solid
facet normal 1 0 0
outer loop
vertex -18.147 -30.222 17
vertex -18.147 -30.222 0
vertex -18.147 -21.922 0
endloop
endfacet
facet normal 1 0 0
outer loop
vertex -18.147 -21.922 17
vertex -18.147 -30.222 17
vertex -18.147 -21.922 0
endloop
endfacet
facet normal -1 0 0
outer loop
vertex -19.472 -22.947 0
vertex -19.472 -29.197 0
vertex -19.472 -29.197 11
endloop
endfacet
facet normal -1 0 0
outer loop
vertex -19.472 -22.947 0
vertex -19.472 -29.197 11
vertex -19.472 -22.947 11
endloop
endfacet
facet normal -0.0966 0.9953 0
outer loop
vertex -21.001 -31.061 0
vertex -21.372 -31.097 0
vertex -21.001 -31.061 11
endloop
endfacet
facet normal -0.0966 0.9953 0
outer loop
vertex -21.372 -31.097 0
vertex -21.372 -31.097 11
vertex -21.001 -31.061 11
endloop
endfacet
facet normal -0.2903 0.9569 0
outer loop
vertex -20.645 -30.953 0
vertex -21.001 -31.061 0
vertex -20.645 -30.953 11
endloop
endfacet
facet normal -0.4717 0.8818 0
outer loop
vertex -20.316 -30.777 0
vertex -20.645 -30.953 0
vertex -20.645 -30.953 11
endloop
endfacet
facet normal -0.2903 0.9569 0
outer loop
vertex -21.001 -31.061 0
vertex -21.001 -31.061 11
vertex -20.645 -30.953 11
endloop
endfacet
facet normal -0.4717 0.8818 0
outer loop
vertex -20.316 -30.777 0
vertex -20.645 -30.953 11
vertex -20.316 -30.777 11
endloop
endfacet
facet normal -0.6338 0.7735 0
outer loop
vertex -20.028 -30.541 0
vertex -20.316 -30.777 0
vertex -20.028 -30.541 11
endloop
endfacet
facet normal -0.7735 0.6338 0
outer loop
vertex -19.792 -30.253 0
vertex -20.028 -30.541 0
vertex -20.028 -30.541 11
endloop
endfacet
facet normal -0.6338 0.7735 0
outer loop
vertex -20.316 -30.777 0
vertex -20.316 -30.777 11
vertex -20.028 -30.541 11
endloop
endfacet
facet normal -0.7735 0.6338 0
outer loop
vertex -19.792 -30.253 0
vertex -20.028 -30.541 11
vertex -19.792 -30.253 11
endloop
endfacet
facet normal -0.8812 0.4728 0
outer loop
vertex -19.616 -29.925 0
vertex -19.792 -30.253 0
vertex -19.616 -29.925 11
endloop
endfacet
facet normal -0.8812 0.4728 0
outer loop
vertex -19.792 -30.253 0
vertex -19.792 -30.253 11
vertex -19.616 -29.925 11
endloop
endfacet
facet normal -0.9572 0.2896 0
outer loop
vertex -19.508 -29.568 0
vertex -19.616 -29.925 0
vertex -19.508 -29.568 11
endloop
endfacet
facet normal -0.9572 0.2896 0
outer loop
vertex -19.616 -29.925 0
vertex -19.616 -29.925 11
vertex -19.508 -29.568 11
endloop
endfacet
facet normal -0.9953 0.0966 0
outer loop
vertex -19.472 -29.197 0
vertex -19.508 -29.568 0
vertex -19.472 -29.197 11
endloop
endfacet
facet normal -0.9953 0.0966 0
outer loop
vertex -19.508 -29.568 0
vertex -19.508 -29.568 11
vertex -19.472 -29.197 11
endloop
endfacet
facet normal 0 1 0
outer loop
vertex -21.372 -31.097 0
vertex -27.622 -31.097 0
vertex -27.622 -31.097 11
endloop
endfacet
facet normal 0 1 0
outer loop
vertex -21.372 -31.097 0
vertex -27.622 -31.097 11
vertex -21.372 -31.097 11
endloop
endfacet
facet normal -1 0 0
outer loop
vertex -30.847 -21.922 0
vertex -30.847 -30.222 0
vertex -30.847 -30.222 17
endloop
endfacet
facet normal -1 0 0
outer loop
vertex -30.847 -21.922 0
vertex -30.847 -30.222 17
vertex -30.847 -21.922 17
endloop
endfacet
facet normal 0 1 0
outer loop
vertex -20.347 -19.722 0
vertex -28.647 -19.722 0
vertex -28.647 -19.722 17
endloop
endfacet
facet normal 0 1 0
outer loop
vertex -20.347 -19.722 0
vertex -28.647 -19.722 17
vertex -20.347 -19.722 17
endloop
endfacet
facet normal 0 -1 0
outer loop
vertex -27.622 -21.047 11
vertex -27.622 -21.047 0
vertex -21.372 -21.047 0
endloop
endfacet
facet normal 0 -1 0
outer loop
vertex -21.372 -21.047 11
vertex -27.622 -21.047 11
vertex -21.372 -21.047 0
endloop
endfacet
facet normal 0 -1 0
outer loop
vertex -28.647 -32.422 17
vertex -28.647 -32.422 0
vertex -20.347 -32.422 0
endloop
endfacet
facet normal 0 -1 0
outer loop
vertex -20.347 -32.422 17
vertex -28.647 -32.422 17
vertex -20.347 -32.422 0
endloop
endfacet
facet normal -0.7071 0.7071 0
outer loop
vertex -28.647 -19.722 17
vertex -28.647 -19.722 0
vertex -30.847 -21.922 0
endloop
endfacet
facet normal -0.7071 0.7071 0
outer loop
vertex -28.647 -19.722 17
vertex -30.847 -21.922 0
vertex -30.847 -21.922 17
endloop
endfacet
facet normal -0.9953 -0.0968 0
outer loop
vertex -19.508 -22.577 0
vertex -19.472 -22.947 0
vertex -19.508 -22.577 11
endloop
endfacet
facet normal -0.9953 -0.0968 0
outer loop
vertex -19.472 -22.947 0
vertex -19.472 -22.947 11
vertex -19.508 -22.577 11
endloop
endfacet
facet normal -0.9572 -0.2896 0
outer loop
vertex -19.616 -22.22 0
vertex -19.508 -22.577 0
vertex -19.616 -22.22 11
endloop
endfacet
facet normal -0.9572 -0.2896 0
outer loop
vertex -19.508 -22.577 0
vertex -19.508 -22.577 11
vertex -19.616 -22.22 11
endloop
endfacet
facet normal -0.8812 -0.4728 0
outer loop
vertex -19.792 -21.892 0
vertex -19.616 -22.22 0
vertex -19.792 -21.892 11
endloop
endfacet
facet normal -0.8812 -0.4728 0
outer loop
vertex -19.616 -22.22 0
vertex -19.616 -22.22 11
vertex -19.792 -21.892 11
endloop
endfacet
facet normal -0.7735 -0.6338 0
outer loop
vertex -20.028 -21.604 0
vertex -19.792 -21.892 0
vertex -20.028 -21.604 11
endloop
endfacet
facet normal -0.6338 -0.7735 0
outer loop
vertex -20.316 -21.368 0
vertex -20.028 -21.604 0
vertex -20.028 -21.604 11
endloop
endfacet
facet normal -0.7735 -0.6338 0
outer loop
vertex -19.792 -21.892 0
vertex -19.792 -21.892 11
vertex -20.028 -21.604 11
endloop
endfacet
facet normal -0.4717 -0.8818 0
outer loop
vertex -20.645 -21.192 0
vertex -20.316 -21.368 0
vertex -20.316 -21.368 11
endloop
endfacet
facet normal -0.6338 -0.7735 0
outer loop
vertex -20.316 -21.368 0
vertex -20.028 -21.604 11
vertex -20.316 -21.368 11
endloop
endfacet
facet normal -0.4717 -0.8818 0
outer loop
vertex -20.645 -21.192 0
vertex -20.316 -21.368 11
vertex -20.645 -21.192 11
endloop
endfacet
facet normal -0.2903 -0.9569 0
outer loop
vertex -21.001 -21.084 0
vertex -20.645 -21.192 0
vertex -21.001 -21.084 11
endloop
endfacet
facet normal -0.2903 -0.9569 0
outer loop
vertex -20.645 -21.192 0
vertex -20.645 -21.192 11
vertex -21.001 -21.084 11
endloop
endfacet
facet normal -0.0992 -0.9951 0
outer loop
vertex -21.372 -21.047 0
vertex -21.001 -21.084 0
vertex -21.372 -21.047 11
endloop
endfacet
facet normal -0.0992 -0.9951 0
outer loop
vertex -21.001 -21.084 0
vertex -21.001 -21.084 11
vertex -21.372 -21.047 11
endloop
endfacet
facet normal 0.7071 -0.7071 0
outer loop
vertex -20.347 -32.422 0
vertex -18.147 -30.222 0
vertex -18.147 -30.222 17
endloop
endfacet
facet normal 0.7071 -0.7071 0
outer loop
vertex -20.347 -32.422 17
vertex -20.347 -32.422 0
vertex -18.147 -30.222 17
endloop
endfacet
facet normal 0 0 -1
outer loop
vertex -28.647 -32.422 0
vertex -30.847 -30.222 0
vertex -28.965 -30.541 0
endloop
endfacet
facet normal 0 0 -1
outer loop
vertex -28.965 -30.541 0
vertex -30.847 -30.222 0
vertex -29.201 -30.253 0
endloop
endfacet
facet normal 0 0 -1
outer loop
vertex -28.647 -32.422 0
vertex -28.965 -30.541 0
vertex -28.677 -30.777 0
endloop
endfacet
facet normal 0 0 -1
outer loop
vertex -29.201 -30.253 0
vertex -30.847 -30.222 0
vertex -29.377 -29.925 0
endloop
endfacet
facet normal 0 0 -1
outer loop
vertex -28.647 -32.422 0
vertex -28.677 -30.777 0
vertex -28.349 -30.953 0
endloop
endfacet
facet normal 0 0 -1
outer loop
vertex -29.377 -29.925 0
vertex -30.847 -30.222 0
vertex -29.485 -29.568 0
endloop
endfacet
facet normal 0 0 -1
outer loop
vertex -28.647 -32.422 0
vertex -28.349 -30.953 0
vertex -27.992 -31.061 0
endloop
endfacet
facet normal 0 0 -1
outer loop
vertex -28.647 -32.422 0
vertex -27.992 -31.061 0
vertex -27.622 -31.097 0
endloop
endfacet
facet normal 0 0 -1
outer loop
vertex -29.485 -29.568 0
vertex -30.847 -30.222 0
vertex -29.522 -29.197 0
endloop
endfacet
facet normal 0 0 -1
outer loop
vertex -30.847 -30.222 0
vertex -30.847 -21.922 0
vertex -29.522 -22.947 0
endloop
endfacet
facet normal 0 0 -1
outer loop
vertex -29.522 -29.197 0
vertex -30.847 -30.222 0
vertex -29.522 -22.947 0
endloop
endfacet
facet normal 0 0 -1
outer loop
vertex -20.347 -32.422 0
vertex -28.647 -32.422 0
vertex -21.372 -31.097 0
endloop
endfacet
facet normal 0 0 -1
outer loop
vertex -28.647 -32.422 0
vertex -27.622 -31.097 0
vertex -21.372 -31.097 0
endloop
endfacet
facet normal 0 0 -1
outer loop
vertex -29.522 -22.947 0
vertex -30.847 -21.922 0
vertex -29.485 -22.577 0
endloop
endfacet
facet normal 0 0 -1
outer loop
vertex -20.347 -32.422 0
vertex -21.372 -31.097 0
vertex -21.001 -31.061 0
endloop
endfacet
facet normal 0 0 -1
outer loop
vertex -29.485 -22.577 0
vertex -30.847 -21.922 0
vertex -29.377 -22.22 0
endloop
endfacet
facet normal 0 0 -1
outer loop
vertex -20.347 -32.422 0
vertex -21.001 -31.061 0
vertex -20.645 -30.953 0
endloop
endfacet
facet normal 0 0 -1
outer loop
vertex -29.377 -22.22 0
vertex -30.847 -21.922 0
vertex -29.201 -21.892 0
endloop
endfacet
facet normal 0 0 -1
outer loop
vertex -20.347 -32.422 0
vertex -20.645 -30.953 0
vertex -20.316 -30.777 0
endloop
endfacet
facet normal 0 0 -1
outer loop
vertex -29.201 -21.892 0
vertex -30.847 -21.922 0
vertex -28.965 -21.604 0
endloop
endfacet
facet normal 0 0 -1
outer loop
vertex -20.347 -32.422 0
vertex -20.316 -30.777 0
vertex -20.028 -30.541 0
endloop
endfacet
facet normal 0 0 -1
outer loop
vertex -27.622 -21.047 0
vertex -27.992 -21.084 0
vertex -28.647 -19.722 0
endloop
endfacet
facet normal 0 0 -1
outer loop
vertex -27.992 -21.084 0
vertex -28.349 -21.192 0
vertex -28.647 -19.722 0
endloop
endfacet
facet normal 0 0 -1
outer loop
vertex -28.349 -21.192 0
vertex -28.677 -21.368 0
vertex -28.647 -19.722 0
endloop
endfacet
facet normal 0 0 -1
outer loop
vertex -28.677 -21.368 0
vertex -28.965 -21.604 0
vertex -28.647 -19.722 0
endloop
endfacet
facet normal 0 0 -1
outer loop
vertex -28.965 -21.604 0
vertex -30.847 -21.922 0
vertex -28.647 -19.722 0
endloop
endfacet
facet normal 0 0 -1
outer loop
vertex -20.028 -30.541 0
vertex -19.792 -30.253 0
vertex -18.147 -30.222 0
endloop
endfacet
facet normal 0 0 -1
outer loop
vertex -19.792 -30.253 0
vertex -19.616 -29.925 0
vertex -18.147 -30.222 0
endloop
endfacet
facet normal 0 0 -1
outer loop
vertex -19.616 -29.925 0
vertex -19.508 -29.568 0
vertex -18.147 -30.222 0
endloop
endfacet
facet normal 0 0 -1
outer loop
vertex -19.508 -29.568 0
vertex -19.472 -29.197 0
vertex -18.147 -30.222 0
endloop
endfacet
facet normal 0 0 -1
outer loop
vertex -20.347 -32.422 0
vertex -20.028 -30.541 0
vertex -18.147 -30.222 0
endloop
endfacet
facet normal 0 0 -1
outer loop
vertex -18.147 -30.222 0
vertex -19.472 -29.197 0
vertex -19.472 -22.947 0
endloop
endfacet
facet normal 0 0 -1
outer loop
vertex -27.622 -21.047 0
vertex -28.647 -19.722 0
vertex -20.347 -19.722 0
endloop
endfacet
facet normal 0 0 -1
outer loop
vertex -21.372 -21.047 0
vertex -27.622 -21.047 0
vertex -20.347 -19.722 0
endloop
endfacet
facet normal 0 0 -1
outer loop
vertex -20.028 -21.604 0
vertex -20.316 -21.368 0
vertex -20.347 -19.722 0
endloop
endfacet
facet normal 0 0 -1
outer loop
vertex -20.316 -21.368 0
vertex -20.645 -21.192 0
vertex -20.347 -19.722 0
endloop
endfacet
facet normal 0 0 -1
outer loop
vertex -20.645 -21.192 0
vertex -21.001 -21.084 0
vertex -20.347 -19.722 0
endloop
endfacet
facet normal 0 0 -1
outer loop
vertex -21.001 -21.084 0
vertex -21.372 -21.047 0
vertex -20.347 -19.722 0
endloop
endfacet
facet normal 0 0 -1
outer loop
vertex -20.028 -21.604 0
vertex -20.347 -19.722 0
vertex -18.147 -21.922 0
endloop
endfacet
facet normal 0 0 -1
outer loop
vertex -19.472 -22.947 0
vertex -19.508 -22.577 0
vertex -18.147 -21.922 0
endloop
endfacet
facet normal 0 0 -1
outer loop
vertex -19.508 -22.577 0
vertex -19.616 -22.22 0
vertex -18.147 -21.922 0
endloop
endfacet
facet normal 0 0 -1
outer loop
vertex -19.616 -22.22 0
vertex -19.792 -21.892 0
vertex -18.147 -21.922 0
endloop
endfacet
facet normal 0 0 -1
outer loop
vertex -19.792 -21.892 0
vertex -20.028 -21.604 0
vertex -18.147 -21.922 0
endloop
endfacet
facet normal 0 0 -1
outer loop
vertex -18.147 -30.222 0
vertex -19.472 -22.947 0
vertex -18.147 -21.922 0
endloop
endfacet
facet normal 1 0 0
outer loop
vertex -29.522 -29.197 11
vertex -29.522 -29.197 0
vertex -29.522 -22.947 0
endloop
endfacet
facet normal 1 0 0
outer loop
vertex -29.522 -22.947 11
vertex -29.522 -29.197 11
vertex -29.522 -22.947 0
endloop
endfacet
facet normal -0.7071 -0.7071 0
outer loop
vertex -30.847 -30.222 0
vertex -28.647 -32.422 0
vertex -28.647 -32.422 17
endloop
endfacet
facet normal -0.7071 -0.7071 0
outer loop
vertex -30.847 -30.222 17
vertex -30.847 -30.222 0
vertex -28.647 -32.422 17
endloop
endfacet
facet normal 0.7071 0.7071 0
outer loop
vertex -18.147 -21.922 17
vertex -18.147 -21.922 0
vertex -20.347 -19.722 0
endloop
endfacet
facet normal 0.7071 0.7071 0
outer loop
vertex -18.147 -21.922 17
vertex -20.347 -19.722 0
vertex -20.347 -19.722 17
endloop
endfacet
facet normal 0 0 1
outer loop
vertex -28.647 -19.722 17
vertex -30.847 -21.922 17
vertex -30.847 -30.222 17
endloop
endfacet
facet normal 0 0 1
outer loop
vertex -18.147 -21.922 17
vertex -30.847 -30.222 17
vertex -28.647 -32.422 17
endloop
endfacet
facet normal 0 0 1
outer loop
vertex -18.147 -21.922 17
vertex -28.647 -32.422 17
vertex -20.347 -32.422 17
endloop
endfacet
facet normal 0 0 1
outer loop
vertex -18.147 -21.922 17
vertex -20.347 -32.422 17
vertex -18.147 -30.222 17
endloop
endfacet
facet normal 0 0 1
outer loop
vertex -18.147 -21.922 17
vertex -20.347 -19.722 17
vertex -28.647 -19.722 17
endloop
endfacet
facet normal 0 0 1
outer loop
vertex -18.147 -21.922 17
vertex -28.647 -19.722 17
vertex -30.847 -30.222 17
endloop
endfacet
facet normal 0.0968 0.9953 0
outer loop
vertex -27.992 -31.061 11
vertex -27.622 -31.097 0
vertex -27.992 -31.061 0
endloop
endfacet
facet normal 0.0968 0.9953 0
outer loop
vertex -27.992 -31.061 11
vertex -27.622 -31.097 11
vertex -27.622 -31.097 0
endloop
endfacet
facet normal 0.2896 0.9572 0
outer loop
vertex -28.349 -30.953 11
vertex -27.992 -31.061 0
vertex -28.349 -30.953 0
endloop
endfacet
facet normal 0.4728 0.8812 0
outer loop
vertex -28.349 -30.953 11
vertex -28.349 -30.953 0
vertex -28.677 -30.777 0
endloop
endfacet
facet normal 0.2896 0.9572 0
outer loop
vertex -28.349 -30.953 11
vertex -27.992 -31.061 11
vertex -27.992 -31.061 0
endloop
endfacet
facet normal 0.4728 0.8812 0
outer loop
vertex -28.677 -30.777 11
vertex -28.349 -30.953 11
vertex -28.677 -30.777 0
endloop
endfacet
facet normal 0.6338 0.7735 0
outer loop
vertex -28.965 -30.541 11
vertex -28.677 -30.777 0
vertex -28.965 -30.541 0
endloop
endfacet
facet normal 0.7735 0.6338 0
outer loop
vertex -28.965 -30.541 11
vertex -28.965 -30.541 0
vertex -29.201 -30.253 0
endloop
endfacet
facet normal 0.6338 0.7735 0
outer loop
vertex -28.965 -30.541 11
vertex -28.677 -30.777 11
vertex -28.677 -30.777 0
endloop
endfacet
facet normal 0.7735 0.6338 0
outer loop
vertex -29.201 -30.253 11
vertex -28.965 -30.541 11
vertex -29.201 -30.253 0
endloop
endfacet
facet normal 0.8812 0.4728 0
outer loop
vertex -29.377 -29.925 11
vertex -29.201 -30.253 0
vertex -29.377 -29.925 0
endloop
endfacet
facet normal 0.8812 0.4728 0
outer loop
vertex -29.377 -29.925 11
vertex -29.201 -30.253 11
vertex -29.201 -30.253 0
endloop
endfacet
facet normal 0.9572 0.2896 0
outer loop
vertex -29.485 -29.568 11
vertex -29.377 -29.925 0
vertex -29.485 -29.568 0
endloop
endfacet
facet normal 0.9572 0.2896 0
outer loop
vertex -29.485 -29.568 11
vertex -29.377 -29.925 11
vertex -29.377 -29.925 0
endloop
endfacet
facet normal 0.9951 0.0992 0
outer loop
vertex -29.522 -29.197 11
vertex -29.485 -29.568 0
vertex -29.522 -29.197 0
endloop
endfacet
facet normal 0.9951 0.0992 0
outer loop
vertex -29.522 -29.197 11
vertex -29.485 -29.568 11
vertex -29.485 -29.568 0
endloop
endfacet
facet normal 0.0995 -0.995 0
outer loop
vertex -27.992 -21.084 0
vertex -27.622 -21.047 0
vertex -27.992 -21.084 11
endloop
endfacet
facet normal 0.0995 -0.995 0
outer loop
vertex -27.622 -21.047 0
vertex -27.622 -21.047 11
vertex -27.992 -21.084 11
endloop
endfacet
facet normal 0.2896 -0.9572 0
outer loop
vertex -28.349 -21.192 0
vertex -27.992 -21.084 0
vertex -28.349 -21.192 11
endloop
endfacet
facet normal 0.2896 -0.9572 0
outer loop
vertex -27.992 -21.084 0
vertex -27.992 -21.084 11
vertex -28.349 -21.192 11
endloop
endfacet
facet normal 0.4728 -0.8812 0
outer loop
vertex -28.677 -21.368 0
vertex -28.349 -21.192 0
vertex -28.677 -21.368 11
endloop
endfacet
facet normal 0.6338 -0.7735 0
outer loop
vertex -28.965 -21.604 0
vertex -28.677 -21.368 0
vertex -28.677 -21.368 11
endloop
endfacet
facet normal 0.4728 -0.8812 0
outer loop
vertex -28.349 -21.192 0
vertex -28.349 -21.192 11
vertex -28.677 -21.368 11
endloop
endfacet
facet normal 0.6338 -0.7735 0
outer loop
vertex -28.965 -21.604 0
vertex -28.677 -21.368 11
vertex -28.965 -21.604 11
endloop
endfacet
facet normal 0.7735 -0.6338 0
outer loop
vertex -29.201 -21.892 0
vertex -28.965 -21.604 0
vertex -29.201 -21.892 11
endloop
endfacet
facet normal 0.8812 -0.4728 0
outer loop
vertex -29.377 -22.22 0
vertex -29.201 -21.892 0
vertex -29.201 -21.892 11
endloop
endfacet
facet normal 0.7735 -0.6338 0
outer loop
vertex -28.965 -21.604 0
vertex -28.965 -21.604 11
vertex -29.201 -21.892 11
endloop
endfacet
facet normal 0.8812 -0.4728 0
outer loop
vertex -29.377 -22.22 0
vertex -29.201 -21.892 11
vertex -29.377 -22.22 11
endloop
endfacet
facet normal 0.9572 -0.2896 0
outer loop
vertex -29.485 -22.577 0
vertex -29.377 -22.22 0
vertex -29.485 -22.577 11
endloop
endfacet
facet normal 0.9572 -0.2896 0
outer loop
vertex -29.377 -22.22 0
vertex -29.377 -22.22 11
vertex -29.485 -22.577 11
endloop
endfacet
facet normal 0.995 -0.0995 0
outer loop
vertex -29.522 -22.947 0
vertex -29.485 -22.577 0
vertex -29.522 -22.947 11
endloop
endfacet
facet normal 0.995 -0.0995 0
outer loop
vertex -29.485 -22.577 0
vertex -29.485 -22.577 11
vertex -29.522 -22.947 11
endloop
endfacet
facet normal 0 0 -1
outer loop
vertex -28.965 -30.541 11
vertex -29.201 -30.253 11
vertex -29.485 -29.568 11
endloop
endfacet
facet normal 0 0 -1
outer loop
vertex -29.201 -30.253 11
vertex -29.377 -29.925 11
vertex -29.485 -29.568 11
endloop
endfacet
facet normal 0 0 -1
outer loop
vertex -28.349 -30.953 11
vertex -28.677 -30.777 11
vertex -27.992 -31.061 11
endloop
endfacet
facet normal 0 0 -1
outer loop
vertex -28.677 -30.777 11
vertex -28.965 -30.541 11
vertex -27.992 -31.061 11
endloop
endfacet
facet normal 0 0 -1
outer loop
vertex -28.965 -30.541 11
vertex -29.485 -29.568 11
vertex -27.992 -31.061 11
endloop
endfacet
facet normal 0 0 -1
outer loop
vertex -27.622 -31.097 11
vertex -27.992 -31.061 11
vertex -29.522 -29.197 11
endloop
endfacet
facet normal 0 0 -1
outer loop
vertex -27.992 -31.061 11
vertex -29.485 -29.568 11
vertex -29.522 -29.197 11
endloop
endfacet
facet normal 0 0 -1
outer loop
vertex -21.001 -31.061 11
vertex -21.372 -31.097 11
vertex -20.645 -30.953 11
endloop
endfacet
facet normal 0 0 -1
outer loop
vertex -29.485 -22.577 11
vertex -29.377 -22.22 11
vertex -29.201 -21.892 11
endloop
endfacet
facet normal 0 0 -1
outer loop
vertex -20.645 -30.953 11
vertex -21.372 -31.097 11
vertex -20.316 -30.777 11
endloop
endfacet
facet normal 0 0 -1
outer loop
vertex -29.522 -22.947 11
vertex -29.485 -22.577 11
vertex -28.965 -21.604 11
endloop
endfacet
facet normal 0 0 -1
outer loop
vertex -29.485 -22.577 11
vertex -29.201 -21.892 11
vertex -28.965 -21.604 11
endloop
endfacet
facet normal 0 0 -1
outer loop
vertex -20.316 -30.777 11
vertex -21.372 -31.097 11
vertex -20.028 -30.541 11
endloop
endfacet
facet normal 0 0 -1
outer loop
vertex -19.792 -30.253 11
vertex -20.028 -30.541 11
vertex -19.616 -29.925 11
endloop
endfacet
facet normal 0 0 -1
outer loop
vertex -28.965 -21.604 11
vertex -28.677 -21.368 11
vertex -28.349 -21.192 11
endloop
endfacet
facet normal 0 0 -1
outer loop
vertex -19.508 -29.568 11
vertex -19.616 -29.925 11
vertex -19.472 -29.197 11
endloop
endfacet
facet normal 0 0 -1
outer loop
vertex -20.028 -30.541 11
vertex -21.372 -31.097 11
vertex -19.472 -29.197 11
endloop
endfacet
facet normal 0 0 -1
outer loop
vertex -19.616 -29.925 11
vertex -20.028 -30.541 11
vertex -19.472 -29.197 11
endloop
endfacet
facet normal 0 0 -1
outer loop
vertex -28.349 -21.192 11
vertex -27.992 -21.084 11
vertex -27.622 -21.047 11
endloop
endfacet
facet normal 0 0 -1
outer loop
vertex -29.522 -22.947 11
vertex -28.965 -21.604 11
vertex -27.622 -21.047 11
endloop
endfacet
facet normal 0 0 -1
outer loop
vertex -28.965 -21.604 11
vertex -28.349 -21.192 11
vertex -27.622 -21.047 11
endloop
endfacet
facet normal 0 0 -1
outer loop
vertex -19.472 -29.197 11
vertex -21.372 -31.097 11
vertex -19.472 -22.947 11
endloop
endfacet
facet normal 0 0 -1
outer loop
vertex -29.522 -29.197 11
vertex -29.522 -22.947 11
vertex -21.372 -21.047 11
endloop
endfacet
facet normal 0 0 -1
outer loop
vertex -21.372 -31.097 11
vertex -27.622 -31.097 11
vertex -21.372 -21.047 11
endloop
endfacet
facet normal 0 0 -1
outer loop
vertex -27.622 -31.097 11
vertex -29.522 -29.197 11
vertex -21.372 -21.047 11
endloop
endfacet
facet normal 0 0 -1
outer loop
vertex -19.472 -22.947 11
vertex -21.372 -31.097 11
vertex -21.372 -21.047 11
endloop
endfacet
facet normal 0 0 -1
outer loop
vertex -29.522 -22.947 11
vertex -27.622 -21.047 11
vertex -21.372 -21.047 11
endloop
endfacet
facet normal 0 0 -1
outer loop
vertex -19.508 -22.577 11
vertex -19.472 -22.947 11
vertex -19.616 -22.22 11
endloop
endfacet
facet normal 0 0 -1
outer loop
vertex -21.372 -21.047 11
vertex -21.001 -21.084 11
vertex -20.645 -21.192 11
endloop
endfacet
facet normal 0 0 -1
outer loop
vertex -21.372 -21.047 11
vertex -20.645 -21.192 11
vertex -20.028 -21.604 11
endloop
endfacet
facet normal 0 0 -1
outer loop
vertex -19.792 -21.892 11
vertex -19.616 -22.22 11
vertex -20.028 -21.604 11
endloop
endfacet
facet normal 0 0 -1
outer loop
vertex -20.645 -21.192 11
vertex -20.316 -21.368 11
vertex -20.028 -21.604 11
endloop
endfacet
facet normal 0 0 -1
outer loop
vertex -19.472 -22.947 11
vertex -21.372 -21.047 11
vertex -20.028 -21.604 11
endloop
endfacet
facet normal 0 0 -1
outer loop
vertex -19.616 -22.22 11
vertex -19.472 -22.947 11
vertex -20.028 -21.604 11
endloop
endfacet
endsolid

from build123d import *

# Parameters (mm, degrees)
F0_W     = 12.7
F0_H     = 12.7
F0_W_2   = 10.05
F0_H_2   = 10.05
F1_DEPTH = 17
F2_DEPTH = 17
F3_DEPTH = 11
F4_SIZE  = 2.2
F5_R     = 1.9


with BuildPart() as f1:
    # F0 (on Top) → F1 (new body)
    with BuildSketch(Plane.XY):
        with Locations((-24.496685, -26.072449)):
            Rectangle(F0_W, F0_H)
        with Locations((-24.496685, -26.072449)):
            Rectangle(F0_W_2, F0_H_2, mode=Mode.SUBTRACT)
    extrude(amount=F1_DEPTH)

    # F0 (on Top) → F2 (join)
    with BuildSketch(Plane.XY):
        with Locations((-24.496685, -26.072449)):
            Rectangle(F0_W_2, F0_H_2)
    extrude(amount=F2_DEPTH)

    # F0 (on Top) → F3 (cut)
    with BuildSketch(Plane.XY):
        with Locations((-24.496685, -26.072449)):
            Rectangle(F0_W_2, F0_H_2)
    extrude(amount=F3_DEPTH, mode=Mode.SUBTRACT)

    # F4
    f4_edges = [f1.edges().sort_by_distance(p)[0] for p in [
        (-18.146685, -19.722449, 8.5),
        (-30.846685, -19.722449, 8.5),
        (-30.846685, -32.422449, 8.5),
        (-18.146685, -32.422449, 8.5),
    ]]
    chamfer(f4_edges, length=F4_SIZE)

    # F5
    f5_edges = [f1.edges().sort_by_distance(p)[0] for p in [
        (-19.471685, -31.097449, 5.5),
        (-19.471685, -21.047449, 5.5),
        (-29.521685, -21.047449, 5.5),
        (-29.521685, -31.097449, 5.5),
    ]]
    fillet(f5_edges, radius=F5_R)


solid = f1.part
